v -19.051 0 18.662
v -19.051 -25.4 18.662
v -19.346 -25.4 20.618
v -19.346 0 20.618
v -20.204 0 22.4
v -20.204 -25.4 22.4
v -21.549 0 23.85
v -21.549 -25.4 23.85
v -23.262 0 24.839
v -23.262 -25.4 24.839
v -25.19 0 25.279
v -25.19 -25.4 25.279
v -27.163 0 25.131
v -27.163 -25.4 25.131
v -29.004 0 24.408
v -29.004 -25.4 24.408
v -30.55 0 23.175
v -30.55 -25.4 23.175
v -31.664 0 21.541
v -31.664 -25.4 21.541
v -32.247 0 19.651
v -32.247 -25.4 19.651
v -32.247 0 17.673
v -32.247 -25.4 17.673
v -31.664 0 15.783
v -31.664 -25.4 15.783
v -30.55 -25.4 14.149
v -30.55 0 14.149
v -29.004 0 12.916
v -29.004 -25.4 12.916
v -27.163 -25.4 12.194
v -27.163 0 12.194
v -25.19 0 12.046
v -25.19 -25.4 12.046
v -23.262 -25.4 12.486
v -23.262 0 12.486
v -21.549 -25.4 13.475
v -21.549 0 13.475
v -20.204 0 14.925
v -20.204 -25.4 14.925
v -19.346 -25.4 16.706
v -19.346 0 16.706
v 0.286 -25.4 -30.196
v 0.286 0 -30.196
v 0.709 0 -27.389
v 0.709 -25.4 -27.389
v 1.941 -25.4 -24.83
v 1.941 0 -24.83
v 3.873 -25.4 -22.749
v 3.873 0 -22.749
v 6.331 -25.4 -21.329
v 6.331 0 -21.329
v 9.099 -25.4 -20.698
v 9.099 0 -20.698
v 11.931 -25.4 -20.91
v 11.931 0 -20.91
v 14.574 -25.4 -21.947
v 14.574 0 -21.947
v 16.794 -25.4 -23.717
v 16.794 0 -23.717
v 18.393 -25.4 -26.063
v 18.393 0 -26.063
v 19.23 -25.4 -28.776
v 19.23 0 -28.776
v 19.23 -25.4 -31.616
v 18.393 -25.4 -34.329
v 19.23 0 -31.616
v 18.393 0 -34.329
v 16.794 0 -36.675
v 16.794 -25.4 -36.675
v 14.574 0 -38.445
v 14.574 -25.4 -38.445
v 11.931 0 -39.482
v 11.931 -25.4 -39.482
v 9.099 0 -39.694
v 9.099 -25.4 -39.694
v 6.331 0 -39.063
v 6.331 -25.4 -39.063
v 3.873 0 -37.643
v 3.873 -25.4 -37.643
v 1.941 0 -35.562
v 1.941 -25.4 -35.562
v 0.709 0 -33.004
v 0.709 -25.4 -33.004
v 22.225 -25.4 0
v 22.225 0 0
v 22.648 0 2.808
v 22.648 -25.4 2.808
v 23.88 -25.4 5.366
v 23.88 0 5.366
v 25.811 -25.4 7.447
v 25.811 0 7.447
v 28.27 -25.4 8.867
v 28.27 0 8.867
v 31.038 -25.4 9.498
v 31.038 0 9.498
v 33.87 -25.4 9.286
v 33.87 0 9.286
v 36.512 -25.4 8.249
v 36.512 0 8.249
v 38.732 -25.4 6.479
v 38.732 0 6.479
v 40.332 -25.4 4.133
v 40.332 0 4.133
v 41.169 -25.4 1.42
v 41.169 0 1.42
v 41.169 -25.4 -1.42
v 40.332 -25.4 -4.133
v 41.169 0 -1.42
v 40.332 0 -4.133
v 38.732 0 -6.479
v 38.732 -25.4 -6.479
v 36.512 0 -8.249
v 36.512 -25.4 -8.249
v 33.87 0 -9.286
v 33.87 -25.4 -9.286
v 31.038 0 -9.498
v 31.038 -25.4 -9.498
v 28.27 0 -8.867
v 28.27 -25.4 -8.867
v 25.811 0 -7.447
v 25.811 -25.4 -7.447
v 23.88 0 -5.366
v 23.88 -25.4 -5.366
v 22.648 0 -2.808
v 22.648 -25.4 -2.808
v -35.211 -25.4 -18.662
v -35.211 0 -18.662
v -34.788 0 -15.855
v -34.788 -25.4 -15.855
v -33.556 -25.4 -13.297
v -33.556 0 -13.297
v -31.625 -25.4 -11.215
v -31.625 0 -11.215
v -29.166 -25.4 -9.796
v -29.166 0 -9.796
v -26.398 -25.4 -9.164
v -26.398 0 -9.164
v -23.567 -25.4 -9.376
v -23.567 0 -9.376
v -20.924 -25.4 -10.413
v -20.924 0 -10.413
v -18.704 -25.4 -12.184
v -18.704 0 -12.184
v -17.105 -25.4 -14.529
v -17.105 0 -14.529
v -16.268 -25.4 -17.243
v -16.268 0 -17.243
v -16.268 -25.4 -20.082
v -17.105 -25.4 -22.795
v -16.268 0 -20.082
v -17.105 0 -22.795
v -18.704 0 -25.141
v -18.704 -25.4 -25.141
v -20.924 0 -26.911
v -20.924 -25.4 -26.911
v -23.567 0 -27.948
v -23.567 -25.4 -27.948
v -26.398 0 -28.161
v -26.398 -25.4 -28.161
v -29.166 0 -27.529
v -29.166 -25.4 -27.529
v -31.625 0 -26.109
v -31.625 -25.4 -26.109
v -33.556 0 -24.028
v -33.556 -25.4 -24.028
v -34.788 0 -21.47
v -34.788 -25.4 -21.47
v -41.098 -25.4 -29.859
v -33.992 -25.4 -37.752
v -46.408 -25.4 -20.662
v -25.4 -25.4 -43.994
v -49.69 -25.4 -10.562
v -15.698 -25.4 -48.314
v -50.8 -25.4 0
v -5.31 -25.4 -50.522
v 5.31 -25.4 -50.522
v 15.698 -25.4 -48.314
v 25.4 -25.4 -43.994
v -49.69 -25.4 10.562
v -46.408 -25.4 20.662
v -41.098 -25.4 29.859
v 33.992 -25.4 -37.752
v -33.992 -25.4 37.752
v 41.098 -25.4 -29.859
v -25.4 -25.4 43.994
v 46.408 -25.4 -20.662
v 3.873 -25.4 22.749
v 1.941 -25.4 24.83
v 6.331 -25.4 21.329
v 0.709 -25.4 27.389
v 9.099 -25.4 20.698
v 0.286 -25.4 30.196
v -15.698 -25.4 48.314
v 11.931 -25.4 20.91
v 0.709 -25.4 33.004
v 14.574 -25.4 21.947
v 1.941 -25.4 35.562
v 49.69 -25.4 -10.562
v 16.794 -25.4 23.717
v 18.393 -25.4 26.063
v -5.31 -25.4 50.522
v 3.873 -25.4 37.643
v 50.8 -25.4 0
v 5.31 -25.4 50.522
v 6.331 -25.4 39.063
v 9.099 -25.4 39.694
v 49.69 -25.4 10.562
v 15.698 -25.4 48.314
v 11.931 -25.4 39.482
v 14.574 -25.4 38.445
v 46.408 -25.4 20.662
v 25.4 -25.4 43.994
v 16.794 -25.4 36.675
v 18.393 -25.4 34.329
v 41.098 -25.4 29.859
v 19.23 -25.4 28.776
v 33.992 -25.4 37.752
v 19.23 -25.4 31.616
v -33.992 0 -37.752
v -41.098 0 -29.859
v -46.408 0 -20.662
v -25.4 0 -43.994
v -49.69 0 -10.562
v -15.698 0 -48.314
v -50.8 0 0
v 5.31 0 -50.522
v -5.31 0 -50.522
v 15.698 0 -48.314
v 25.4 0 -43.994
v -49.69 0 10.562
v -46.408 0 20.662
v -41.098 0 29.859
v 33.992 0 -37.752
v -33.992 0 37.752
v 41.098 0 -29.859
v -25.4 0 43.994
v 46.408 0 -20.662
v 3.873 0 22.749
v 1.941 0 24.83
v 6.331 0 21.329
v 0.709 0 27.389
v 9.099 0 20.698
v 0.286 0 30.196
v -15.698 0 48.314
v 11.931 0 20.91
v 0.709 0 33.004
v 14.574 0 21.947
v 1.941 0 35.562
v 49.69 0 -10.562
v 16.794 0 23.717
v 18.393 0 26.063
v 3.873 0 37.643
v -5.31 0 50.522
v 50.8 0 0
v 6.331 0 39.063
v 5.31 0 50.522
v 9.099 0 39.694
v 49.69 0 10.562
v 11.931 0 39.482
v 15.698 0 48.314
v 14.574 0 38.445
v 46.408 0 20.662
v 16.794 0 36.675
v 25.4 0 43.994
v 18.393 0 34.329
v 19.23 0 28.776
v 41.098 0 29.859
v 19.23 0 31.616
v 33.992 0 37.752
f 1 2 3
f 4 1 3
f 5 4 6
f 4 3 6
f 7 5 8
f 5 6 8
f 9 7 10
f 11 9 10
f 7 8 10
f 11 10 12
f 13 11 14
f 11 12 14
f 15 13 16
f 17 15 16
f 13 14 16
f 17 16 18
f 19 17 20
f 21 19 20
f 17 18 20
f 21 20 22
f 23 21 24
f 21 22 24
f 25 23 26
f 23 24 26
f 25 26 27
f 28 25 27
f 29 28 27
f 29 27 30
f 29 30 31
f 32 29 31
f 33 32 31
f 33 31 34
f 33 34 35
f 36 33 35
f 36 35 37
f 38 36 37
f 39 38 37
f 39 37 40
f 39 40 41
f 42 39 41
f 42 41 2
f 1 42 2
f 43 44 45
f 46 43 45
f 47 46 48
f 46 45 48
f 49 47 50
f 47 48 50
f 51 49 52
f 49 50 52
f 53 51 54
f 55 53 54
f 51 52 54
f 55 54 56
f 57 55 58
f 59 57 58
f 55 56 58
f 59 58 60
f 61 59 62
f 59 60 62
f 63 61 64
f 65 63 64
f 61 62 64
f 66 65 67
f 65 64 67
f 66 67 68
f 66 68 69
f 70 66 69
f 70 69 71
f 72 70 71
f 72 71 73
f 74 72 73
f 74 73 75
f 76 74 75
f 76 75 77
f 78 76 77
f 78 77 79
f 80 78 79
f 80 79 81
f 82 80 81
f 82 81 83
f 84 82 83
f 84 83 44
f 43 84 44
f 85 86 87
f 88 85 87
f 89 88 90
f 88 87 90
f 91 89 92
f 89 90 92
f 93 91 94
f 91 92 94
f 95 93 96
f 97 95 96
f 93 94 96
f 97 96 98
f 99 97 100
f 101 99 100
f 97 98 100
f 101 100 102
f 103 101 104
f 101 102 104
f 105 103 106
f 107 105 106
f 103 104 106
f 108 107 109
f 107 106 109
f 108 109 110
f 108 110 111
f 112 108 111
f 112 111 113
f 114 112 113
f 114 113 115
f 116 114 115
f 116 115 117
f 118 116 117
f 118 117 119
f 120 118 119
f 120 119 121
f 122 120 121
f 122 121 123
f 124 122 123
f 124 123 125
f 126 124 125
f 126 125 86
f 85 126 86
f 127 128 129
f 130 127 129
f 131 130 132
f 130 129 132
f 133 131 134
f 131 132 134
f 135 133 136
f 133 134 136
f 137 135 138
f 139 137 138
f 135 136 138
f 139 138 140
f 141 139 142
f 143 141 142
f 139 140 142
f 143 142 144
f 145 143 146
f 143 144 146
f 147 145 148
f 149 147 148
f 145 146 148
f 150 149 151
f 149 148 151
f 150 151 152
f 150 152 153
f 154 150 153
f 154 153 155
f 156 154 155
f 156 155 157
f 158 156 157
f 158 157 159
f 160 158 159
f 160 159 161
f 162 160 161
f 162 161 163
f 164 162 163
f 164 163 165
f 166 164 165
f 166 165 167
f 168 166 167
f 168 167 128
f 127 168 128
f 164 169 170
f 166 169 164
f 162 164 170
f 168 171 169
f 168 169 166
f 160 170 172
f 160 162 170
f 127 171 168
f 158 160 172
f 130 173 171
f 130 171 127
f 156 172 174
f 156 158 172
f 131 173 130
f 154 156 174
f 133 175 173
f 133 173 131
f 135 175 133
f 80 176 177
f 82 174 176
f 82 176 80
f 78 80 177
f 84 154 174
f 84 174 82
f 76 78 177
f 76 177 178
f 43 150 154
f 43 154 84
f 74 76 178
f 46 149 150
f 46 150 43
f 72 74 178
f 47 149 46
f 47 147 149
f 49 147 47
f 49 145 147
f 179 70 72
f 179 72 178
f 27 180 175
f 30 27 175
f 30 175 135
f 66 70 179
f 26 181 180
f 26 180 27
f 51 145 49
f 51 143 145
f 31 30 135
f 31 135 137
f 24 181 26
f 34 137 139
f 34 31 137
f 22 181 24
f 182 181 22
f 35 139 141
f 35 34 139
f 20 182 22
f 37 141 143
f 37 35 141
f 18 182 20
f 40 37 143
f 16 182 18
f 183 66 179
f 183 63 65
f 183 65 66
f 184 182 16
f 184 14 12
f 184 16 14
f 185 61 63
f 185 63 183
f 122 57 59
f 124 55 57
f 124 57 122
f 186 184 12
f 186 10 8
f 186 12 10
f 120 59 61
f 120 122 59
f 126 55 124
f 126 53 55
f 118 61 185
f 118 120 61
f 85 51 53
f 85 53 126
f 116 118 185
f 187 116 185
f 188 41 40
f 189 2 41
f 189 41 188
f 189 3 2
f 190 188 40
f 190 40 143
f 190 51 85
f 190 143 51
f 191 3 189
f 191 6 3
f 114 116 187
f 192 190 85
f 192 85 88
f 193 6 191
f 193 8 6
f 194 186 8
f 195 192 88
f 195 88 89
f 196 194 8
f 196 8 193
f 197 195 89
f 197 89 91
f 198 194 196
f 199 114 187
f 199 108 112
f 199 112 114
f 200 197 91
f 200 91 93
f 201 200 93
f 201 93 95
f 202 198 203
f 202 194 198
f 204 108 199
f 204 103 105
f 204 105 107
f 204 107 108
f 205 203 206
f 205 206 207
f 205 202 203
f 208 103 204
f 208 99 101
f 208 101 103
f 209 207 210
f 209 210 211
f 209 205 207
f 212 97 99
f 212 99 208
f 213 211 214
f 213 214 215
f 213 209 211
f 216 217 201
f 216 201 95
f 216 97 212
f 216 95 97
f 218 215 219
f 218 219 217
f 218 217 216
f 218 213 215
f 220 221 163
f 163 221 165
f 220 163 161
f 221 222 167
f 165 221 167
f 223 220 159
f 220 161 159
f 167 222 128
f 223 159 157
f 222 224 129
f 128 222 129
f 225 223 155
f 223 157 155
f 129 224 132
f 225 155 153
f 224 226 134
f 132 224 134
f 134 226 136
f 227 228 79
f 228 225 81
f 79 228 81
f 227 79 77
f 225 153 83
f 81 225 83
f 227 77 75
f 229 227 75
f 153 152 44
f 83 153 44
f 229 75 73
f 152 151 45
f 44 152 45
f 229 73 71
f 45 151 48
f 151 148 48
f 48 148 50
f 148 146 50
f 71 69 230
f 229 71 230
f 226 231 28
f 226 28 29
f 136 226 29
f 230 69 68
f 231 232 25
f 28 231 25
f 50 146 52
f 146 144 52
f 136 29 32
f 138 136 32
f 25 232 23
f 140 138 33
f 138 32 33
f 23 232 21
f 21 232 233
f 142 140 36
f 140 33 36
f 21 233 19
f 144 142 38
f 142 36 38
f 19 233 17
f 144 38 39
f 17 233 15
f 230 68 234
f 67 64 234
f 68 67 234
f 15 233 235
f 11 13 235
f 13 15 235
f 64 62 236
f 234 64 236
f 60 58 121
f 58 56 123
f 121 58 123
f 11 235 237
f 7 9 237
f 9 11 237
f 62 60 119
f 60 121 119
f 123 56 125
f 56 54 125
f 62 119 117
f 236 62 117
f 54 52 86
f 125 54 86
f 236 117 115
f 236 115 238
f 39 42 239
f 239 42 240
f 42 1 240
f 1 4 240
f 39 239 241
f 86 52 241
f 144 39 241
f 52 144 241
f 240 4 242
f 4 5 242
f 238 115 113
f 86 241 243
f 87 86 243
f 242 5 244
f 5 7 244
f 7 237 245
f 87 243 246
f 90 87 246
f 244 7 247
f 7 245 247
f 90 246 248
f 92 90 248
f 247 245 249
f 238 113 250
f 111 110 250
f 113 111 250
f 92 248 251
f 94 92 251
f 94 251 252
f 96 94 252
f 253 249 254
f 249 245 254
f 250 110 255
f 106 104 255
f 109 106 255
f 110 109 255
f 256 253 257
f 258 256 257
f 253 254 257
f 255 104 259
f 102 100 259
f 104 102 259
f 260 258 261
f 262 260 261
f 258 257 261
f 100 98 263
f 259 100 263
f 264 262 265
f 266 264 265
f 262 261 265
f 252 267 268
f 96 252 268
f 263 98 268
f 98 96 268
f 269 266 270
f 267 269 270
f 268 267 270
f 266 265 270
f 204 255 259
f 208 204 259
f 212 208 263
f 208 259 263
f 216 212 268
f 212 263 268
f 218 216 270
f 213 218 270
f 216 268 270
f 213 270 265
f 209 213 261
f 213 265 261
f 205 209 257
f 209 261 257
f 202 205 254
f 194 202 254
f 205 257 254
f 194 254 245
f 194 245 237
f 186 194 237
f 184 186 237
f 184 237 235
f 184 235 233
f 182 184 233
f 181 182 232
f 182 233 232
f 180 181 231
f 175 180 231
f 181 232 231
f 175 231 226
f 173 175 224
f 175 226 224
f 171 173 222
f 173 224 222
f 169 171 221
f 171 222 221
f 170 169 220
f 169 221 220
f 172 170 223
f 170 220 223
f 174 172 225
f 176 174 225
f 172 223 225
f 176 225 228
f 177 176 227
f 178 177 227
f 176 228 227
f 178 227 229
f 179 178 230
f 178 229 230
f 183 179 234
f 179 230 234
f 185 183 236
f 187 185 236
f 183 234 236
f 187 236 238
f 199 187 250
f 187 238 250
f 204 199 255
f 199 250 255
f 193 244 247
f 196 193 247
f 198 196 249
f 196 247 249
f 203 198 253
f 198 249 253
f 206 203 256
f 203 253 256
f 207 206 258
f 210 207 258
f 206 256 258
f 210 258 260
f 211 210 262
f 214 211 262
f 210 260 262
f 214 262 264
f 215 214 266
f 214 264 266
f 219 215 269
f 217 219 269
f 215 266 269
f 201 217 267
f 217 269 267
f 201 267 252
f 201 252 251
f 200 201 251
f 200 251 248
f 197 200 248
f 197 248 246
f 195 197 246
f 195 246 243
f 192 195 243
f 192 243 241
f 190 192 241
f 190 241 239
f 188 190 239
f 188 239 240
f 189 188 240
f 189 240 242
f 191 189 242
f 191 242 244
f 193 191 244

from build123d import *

# Parameters (mm, degrees)
F0_R      = 50.8
F1_DEPTH  = 25.4
F3_D      = 19.05
F4_R      = 6.634992
F5_DEPTH  = 25.4
F6_R      = 3.175
F7_DEPTH  = 25.4
F5_FACE_R = 6.634992
F8_DEPTH  = 101.6


with BuildPart() as f1:
    # F0 (on Front) → F1 (new body)
    with BuildSketch(Plane.XZ):
        Circle(F0_R)
        Polygon((15.875, 27.496307), (31.75, 0), (15.875, -27.496307), (-15.875, -27.496307), (-31.75, 0), (-15.875, 27.496307), align=None, mode=Mode.SUBTRACT)
        Polygon((15.875, -27.496307), (31.75, 0), (15.875, 27.496307), (-15.875, 27.496307), (-31.75, 0), (-15.875, -27.496307), align=None)
    extrude(amount=F1_DEPTH)

    # F3 (through all)
    with Locations(Plane.XZ.offset(25.4)):
        with Locations((9.81129, 30.196044), (31.75, 0), (-25.68629, -18.662182), (9.81129, -30.196044)):
            Hole(F3_D / 2)

    # F4 (on face) → F5 (join)
    with BuildSketch(Plane.XZ.offset(25.4)):
        with Locations((-25.68629, 18.662182)):
            Circle(F4_R)
    extrude(amount=F5_DEPTH)

    # F6 (on face) → F7 (join)
    with BuildSketch(Plane.XZ.offset(25.4)):
        with Locations((-25.68629, 18.662182)):
            Circle(F6_R)
    extrude(amount=F7_DEPTH)

    # F5_face (on face) → F8 (cut)
    with BuildSketch(Plane(origin=(-25.68629, -50.8, 18.662182), x_dir=(1, 0, 0), z_dir=(0, -1, 0))):
        Circle(F5_FACE_R)
    extrude(amount=-F8_DEPTH, mode=Mode.SUBTRACT)


solid = f1.part
